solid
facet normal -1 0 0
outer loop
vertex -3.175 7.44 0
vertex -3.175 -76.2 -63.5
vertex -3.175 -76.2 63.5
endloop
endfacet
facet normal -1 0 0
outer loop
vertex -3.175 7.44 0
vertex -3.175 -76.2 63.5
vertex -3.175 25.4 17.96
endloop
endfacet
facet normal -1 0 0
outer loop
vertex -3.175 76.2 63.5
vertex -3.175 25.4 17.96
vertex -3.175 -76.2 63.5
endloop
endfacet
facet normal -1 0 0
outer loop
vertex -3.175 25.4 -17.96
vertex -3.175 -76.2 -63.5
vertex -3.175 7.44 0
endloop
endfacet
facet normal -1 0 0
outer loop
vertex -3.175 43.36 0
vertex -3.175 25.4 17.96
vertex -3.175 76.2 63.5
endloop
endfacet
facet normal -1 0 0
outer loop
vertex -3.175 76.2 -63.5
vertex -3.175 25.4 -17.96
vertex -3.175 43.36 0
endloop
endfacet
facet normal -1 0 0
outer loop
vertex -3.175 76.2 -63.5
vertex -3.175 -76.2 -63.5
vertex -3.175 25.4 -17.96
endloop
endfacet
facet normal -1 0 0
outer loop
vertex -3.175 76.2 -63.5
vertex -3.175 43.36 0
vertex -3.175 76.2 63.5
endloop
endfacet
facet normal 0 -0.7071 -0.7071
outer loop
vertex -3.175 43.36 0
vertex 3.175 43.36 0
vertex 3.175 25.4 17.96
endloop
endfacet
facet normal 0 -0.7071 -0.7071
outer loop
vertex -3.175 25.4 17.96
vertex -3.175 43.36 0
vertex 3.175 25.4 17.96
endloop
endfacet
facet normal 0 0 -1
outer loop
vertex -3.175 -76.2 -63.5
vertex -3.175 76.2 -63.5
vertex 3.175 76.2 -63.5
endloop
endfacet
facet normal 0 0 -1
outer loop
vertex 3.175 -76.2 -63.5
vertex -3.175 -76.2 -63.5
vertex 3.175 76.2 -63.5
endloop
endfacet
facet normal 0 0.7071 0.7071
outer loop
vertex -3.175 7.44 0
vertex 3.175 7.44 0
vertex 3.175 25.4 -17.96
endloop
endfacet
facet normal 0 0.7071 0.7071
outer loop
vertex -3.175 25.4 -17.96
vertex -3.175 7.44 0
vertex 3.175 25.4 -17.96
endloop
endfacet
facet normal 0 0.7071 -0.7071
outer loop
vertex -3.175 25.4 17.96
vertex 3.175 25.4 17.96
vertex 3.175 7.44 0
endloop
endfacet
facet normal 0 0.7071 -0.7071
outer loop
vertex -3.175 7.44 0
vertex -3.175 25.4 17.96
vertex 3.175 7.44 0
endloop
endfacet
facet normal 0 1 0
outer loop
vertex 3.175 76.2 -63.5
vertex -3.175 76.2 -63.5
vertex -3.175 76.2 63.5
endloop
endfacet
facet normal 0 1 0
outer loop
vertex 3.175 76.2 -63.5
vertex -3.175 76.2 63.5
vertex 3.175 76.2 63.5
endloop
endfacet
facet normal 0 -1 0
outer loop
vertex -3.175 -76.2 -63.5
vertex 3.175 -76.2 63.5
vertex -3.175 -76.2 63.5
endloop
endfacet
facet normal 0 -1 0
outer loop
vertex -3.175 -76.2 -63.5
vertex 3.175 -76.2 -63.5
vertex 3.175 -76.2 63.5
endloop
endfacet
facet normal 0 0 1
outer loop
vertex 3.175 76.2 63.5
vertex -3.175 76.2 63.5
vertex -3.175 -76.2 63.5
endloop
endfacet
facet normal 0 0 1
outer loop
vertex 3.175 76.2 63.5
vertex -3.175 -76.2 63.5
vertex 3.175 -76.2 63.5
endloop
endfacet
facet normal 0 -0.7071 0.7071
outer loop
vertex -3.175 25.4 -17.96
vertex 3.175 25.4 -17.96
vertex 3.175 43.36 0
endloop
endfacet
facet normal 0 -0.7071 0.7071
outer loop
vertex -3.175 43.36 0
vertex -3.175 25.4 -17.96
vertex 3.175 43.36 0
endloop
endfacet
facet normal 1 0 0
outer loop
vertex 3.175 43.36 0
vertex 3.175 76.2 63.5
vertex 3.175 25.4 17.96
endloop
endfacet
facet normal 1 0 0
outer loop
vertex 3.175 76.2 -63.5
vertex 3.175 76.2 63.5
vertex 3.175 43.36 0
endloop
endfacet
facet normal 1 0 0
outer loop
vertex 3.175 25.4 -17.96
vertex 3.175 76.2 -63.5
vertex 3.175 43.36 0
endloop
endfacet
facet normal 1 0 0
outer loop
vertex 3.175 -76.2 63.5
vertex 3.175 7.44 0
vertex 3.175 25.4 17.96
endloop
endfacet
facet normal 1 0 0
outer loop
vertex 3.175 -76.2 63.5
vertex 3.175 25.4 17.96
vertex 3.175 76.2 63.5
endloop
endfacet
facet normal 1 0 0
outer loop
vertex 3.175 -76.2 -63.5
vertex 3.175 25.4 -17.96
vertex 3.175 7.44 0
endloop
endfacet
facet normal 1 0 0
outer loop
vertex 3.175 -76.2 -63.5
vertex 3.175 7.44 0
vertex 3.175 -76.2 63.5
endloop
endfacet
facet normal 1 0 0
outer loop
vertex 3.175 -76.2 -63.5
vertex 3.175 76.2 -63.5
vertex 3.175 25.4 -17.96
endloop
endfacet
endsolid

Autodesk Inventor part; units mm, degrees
ref_plane "YZ Plane" through (0, 0, 0) normal (1, 0, 0) x (0, 1, 0)
ref_plane "XZ Plane" through (0, 0, 0) normal (0, 1, 0) x (-1, 0, 0)
ref_plane "XY Plane" through (0, 0, 0) normal (0, 0, 1) x (1, 0, 0)
sketch "Sketch1" plane through (0, 0, 0) normal (0, 0, 1) x (1, 0, 0)
  line L0 (-3.175, 76.2) -> (3.175, 76.2)
  line L1 (3.175, 76.2) -> (3.175, -76.2)
  line L2 (3.175, -76.2) -> (-3.175, -76.2)
  line L3 (-3.175, -76.2) -> (-3.175, 76.2)
  line L4 (-3.175, 76.2) -> (3.175, -76.2) construction
  line L5 (3.175, 76.2) -> (-3.175, -76.2) construction
  point P0 (0, 0)
  dimension "d0" = 6.35
  dimension "d1" = 152.4
extrude "Extrusion1" add sketch "Sketch1" along normal mid plane 127
sketch "Sketch2" plane through (3.175, -76.2, 63.5) normal (1, 0, 0) x (0, 0, -1)
  line L0 (63.5, 83.6395) -> (81.4605, 101.6)
  line L1 (81.4605, 101.6) -> (63.5, 119.5605)
  line L2 (63.5, 119.5605) -> (45.5395, 101.6)
  line L3 (45.5395, 101.6) -> (63.5, 83.6395)
  line L4 (63.5, 83.6395) -> (63.5, 119.5605) construction
  line L5 (81.4605, 101.6) -> (45.5395, 101.6) construction
  line L6 (63.5, 83.6395) -> (88.9, 83.6395) construction
  line L7 (127, 152.4) -> (0, 152.4) projected
  point P0 (63.5, 76.2)
  point P1 (63.5, 101.6)
  point P2 (63.5, 152.4)
  point P3 (63.5, 101.6)
  dimension "d4" = 25.4
  dimension "d5" = 45
  dimension "d6" = 25.4
  dimension "d7" = 50.8
extrude "Extrusion2" cut sketch "Sketch2" against normal up to surface (6.35 mm away)
properties part number "x_axis_wood_mount" material "Wood (Birch)"
